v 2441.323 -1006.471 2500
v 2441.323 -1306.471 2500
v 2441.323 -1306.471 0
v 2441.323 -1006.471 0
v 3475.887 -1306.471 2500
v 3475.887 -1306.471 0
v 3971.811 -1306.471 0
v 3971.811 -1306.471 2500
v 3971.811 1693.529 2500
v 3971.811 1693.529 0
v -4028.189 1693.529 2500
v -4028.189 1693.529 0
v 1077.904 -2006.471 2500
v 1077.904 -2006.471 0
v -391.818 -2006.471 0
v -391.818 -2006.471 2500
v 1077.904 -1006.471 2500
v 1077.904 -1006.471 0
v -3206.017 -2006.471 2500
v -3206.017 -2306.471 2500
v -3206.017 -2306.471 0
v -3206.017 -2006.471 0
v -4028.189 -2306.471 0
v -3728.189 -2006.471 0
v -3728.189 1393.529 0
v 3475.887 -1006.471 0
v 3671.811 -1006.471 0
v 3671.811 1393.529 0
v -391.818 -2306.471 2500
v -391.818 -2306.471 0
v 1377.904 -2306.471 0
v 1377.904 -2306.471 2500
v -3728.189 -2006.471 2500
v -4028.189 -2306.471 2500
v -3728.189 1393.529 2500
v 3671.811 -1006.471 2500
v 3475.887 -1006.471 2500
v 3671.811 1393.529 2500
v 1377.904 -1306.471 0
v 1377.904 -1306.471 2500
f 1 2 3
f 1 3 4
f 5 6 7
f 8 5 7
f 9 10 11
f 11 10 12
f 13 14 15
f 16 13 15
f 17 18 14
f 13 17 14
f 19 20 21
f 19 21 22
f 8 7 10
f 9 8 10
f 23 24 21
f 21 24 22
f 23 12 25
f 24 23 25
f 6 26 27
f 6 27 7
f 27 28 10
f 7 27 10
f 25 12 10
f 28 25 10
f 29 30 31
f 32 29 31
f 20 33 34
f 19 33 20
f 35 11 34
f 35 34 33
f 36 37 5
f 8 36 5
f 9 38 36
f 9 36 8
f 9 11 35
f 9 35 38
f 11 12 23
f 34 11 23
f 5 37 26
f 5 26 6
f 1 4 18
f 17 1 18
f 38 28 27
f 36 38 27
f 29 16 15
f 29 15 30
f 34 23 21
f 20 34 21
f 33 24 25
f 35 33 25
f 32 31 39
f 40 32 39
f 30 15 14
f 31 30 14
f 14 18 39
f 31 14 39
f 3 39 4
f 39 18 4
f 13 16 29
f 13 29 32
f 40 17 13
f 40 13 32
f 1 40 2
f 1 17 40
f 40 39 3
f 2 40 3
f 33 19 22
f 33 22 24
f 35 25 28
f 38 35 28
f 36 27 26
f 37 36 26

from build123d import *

# Parameters (mm, degrees)
F1_DEPTH = 2500


# Not quite as in the source:
# - a feature of the source that left no trace in its solid (it failed there, or was rolled back) is left out


with BuildPart() as f1:
    # F0 (on Top) → F1 (new body)
    with BuildSketch(Plane.XY):
        Polygon((3971.811182797, 1693.5292053778), (-4028.188817203, 1693.5292053778), (-4028.188817203, -2306.4707946222), (-3206.0170832425, -2306.4707946222), (-3206.0170832425, -2006.4707946222), (-3728.188817203, -2006.4707946222), (-3728.188817203, 1393.5292053778), (3671.811182797, 1393.5292053778), (3671.811182797, -1006.4707946222), (3475.8865002422, -1006.4707946222), (3475.8865002422, -1306.4707946222), (3971.811182797, -1306.4707946222), align=None)
    extrude(amount=F1_DEPTH)


with BuildPart() as f1b:
    # F0 (on Top) → F1, piece 2 (new body)
    with BuildSketch(Plane.XY):
        Polygon((1377.9044771042, -1306.4707946222), (2441.3231871367, -1306.4707946222), (2441.3231871367, -1006.4707946222), (1077.9044771042, -1006.4707946222), (1077.9044771042, -2006.4707946222), (-391.8183739582, -2006.4707946222), (-391.8183739582, -2306.4707946222), (1377.9044771042, -2306.4707946222), align=None)
    extrude(amount=F1_DEPTH)


solid = Compound([f1.part, f1b.part])
